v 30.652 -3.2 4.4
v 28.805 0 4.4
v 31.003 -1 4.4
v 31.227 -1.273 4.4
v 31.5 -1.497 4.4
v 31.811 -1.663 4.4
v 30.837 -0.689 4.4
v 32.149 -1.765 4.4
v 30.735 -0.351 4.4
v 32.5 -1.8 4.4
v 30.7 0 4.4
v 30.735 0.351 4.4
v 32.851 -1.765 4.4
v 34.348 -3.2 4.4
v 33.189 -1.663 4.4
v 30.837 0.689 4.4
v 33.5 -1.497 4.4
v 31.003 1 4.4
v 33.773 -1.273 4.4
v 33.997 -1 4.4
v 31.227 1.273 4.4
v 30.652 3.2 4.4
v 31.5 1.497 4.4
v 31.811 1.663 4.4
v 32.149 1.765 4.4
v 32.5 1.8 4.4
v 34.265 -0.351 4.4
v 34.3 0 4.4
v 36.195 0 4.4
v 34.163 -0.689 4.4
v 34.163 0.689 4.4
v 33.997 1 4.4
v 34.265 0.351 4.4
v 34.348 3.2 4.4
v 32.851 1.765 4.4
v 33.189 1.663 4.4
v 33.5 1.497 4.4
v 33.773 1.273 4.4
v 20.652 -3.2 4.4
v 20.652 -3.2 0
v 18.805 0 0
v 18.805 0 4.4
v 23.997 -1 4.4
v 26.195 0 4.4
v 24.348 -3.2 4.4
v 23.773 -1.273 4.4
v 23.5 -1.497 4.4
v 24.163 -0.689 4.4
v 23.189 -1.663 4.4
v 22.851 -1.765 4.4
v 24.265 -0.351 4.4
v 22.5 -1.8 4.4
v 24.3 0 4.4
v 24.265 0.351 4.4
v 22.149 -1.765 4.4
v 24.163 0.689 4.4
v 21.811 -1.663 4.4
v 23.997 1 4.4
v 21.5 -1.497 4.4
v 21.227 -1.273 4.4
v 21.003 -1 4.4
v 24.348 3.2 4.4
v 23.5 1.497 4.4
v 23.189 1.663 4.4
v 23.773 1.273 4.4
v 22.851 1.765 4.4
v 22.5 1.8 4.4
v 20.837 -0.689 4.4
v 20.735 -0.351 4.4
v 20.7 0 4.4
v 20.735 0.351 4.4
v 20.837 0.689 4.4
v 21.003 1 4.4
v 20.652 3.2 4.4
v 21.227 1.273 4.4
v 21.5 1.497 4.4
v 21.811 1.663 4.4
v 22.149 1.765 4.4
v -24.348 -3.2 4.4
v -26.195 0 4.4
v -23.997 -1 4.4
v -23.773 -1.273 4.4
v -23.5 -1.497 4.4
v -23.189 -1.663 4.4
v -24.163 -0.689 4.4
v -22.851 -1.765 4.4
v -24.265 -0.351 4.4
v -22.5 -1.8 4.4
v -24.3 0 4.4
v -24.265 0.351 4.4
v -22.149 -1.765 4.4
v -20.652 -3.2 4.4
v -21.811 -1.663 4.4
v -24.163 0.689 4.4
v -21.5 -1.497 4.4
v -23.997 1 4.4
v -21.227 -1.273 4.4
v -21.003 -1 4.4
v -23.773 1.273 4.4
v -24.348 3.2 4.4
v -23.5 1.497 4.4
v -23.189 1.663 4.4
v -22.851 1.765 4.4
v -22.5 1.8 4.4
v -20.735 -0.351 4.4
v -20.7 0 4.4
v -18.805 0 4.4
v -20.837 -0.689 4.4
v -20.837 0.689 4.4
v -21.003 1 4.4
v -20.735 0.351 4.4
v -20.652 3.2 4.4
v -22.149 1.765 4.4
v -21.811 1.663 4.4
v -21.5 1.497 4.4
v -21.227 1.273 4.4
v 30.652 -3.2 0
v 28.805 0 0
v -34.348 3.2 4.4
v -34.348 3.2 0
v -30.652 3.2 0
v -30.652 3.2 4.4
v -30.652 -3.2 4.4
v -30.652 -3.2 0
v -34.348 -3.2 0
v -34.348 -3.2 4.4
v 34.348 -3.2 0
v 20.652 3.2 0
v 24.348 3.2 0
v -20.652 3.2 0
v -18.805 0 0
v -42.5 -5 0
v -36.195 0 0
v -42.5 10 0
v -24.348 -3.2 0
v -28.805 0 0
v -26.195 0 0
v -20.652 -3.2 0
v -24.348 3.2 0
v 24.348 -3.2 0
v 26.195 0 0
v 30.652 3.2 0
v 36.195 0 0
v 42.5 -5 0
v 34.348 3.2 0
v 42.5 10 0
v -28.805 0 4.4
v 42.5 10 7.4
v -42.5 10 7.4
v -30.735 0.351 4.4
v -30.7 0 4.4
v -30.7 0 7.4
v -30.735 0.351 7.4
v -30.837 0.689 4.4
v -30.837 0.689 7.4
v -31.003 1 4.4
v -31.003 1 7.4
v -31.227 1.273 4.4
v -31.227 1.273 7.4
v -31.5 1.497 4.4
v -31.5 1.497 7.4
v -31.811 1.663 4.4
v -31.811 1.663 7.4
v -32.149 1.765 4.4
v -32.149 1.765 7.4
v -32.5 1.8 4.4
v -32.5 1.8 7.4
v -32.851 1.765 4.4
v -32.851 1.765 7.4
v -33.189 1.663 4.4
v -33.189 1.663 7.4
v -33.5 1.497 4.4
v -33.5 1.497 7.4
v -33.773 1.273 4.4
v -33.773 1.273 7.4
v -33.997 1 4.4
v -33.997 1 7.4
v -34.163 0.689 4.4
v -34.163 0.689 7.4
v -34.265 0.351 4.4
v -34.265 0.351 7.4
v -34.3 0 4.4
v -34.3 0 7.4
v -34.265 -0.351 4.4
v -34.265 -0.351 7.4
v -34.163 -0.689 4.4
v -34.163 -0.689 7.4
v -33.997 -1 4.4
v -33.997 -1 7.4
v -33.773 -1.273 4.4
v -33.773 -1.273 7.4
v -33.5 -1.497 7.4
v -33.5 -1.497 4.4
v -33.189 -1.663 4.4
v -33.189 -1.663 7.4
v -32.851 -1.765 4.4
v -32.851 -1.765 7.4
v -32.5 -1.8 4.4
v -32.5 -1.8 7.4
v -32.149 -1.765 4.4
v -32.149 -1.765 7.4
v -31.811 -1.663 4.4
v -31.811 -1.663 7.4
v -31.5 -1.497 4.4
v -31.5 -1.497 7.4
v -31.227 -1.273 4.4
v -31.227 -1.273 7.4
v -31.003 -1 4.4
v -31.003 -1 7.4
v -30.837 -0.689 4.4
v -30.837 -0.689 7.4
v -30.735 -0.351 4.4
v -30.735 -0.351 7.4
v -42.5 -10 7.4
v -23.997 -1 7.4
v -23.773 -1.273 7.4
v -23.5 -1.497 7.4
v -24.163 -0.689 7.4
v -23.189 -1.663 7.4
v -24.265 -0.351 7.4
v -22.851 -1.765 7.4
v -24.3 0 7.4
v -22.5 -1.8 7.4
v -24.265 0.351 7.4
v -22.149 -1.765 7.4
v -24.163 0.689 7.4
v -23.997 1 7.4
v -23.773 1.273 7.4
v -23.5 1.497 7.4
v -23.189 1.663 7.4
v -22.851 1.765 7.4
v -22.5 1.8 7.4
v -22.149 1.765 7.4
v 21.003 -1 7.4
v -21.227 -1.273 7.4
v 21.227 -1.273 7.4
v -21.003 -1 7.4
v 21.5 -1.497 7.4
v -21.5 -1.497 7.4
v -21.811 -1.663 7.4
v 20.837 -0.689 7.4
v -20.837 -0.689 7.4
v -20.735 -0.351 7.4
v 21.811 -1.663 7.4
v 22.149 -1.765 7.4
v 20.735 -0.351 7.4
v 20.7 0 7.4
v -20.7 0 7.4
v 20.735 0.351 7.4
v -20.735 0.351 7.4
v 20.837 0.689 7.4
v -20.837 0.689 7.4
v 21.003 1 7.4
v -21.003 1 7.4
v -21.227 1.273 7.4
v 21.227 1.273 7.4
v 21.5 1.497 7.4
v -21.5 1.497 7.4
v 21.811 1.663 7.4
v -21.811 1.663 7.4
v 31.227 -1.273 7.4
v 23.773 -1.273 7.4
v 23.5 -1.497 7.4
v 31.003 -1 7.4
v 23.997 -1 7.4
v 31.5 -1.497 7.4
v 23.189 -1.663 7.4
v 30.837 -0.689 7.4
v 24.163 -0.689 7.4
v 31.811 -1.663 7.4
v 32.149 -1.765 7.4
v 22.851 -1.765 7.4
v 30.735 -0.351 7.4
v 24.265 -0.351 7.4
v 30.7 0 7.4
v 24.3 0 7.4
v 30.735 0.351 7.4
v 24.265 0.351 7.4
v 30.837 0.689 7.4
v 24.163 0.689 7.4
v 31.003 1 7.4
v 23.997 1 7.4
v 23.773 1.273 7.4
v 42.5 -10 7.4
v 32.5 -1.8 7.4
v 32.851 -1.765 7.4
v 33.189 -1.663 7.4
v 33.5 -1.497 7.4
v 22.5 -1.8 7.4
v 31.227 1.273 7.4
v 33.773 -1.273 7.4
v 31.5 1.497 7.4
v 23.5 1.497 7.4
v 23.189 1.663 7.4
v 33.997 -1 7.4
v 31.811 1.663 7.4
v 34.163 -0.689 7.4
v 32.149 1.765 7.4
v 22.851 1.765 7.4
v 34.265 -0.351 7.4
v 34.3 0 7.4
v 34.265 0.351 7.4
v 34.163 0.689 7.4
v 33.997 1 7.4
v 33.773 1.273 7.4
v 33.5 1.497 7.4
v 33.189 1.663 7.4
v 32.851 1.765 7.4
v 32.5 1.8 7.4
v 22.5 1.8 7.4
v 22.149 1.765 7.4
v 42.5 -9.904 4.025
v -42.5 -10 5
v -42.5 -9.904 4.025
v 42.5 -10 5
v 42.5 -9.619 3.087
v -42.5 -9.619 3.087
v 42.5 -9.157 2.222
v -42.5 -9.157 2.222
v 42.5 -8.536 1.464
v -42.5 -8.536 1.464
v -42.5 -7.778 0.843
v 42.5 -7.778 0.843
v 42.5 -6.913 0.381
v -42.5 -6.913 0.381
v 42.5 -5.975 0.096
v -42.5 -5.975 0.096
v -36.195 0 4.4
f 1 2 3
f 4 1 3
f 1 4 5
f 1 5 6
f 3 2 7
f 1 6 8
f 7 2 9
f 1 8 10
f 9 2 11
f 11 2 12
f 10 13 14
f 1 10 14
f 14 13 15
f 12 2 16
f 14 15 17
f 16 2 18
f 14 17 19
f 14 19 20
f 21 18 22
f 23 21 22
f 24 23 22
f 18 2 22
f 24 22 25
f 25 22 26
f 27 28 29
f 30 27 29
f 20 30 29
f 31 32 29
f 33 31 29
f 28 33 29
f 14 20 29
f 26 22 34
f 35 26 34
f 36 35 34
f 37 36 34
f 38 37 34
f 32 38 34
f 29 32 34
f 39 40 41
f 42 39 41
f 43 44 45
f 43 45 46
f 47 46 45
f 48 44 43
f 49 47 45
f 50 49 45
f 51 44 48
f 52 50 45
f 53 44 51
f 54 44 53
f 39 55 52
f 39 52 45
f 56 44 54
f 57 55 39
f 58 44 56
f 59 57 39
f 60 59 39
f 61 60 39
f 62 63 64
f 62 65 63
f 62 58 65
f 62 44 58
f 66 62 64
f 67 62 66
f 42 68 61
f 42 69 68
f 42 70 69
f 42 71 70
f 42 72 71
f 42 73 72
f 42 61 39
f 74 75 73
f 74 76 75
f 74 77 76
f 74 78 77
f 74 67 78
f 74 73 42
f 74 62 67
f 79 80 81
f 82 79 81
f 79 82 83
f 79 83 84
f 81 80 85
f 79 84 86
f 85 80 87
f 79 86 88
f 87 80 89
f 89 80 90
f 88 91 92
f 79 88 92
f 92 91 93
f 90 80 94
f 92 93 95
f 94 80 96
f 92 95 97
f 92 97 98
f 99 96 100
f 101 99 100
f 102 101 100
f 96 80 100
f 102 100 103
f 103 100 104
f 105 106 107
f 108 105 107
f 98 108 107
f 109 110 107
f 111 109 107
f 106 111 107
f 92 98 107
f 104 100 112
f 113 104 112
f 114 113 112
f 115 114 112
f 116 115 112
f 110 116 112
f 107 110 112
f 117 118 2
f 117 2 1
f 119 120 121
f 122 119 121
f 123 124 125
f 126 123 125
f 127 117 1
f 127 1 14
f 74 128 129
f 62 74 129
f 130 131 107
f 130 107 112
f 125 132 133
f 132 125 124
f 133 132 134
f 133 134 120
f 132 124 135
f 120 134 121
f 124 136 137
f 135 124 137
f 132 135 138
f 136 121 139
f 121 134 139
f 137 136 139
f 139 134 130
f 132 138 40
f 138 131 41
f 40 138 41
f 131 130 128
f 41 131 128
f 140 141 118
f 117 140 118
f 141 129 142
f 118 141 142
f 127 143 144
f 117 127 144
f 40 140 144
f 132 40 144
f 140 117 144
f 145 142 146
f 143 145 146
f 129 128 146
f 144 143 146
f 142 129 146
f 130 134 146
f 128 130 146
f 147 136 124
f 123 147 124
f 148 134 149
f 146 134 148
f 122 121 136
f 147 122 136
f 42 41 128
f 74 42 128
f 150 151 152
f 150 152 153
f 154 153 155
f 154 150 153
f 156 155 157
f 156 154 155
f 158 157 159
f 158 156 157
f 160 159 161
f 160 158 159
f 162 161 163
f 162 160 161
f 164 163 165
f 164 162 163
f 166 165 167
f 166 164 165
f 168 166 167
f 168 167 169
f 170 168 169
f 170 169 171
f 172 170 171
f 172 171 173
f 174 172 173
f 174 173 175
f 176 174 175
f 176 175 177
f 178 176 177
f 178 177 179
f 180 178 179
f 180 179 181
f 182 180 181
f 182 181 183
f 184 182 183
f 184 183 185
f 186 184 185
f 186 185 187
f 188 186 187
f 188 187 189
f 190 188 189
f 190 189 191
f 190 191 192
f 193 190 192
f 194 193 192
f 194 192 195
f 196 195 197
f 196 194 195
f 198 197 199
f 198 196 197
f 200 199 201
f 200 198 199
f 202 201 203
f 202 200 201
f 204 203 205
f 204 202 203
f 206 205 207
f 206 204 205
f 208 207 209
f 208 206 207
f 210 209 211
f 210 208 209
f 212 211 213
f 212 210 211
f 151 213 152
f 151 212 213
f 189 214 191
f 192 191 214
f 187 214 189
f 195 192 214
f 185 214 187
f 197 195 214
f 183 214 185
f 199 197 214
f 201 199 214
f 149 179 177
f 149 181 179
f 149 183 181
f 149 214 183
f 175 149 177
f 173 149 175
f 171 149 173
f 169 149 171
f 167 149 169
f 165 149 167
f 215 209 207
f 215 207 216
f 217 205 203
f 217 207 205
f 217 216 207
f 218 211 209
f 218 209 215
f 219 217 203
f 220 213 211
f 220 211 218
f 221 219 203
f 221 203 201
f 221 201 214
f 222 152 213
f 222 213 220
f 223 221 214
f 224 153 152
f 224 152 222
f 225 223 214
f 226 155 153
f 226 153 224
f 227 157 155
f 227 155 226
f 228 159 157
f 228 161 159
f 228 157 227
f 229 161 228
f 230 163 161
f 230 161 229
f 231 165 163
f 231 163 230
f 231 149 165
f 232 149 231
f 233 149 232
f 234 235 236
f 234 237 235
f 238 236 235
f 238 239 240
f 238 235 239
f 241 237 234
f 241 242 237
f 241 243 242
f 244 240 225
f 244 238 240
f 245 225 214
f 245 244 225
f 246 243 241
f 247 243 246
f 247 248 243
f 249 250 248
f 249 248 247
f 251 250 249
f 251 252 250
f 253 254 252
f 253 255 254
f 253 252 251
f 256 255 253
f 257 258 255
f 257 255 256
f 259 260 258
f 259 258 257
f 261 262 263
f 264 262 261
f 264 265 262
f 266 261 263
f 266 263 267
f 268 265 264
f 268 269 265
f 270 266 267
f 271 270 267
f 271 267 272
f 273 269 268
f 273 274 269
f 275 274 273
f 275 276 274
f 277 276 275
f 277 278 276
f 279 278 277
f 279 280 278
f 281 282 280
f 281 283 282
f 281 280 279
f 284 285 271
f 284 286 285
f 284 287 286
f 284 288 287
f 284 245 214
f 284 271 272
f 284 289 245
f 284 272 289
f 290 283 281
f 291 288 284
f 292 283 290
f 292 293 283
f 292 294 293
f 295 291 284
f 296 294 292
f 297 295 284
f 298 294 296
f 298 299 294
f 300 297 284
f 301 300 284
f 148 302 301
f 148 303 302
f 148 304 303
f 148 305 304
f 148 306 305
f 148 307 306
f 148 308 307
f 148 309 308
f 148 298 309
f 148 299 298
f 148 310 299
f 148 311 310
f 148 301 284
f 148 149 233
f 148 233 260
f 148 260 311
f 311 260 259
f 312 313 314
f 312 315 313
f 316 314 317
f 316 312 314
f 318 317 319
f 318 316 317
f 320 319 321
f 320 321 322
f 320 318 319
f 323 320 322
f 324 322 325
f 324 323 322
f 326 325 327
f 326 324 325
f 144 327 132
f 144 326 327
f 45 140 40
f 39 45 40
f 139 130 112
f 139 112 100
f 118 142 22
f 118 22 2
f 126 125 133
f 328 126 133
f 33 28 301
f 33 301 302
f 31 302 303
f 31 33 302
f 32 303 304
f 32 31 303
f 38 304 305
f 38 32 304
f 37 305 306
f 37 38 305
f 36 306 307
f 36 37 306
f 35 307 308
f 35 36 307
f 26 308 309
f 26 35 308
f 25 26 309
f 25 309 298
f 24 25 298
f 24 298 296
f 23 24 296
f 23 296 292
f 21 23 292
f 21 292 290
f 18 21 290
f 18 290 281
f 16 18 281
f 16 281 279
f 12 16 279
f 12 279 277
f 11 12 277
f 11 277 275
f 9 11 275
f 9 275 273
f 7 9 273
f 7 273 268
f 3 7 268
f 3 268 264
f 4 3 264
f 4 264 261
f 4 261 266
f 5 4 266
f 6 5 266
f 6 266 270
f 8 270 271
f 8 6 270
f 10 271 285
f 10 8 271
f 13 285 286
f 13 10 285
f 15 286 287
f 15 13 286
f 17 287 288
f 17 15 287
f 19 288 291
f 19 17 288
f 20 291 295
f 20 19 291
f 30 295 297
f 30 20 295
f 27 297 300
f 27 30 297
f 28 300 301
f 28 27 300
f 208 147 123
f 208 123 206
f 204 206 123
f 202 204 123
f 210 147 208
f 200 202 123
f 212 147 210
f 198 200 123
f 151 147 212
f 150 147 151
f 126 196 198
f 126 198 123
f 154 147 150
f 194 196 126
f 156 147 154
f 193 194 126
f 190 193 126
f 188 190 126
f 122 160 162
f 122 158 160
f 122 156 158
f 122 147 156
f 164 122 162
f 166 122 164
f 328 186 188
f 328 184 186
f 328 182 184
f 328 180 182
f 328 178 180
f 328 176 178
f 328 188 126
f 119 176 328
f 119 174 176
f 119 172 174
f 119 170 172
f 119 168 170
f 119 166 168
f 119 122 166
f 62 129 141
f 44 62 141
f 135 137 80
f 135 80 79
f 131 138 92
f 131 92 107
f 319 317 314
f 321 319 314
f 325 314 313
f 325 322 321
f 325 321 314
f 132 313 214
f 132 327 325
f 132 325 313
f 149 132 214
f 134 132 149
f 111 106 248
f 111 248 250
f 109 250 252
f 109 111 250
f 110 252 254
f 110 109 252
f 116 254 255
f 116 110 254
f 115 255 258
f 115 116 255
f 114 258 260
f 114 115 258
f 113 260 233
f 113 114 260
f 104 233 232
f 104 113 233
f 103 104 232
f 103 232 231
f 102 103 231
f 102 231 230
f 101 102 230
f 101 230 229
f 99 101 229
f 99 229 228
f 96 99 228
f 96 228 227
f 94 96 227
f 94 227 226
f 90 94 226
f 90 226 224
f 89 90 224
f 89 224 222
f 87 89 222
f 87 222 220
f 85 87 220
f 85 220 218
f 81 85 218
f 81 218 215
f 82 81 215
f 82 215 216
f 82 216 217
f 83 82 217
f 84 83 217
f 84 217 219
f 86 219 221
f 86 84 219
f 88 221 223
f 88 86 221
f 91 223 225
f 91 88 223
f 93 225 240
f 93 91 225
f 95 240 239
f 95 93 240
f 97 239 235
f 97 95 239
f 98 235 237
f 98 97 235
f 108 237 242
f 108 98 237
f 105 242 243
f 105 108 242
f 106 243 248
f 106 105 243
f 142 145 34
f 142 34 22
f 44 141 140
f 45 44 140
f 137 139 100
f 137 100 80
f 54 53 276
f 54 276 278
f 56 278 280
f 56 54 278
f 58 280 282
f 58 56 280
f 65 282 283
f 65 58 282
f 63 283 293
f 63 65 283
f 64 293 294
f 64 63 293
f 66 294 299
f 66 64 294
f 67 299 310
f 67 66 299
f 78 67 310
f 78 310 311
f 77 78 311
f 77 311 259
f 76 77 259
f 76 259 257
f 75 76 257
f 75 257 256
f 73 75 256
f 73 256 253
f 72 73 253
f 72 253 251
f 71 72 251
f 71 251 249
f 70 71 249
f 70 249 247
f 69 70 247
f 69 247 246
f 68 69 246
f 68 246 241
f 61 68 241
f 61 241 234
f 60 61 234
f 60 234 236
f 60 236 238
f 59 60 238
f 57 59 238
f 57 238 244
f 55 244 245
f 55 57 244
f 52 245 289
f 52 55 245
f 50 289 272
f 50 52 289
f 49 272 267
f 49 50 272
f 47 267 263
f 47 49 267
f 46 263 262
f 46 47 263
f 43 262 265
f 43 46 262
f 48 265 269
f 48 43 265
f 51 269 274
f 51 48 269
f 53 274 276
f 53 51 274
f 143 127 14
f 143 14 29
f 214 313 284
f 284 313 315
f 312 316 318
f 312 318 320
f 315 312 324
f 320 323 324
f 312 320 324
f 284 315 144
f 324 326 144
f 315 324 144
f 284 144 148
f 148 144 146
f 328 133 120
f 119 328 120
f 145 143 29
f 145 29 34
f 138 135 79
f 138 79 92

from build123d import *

# Parameters (mm, degrees)
SKETCH1_W           = 85
SKETCH1_H           = 20
SKETCH1_R           = 1.8
BOSS_EXTRUDE1_DEPTH = 7.4
CUT_EXTRUDE1_DEPTH  = 4.4
FILLET1_R           = 5


with BuildPart() as part:
    # Sketch1 → Boss-Extrude1 (new body)
    with BuildSketch(Plane.XY):
        Rectangle(SKETCH1_W, SKETCH1_H)
        with Locations((-32.5, 0)):
            Circle(SKETCH1_R, mode=Mode.SUBTRACT)
        with Locations((-22.5, 0)):
            Circle(SKETCH1_R, mode=Mode.SUBTRACT)
        with Locations((32.5, 0)):
            Circle(SKETCH1_R, mode=Mode.SUBTRACT)
        with Locations((22.5, 0)):
            Circle(SKETCH1_R, mode=Mode.SUBTRACT)
    extrude(amount=BOSS_EXTRUDE1_DEPTH)

    # Sketch2 → Cut-Extrude1 (cut)
    with BuildSketch(Plane(origin=(0, 0, 0), x_dir=(-1, 0, 0), z_dir=(0, 0, -1))):
        Polygon((20.652479139, -3.2), (18.804958277, 0), (20.652479139, 3.2), (24.347520861, 3.2), (26.195041723, 0), (24.347520861, -3.2), align=None)
        Polygon((36.195041723, 0), (34.347520861, 3.2), (30.652479139, 3.2), (28.804958277, 0), (30.652479139, -3.2), (34.347520861, -3.2), align=None)
        Polygon((-18.804958277, 0), (-20.652479139, 3.2), (-24.347520861, 3.2), (-26.195041723, 0), (-24.347520861, -3.2), (-20.652479139, -3.2), align=None)
        Polygon((-34.347520861, -3.2), (-36.195041723, 0), (-34.347520861, 3.2), (-30.652479139, 3.2), (-28.804958277, 0), (-30.652479139, -3.2), align=None)
    extrude(amount=-CUT_EXTRUDE1_DEPTH, mode=Mode.SUBTRACT)

    # Fillet1
    fillet1_edges = [part.edges().sort_by_distance(p)[0] for p in [
        (0, -10, 0),
    ]]
    fillet(fillet1_edges, radius=FILLET1_R)


solid = part.part
